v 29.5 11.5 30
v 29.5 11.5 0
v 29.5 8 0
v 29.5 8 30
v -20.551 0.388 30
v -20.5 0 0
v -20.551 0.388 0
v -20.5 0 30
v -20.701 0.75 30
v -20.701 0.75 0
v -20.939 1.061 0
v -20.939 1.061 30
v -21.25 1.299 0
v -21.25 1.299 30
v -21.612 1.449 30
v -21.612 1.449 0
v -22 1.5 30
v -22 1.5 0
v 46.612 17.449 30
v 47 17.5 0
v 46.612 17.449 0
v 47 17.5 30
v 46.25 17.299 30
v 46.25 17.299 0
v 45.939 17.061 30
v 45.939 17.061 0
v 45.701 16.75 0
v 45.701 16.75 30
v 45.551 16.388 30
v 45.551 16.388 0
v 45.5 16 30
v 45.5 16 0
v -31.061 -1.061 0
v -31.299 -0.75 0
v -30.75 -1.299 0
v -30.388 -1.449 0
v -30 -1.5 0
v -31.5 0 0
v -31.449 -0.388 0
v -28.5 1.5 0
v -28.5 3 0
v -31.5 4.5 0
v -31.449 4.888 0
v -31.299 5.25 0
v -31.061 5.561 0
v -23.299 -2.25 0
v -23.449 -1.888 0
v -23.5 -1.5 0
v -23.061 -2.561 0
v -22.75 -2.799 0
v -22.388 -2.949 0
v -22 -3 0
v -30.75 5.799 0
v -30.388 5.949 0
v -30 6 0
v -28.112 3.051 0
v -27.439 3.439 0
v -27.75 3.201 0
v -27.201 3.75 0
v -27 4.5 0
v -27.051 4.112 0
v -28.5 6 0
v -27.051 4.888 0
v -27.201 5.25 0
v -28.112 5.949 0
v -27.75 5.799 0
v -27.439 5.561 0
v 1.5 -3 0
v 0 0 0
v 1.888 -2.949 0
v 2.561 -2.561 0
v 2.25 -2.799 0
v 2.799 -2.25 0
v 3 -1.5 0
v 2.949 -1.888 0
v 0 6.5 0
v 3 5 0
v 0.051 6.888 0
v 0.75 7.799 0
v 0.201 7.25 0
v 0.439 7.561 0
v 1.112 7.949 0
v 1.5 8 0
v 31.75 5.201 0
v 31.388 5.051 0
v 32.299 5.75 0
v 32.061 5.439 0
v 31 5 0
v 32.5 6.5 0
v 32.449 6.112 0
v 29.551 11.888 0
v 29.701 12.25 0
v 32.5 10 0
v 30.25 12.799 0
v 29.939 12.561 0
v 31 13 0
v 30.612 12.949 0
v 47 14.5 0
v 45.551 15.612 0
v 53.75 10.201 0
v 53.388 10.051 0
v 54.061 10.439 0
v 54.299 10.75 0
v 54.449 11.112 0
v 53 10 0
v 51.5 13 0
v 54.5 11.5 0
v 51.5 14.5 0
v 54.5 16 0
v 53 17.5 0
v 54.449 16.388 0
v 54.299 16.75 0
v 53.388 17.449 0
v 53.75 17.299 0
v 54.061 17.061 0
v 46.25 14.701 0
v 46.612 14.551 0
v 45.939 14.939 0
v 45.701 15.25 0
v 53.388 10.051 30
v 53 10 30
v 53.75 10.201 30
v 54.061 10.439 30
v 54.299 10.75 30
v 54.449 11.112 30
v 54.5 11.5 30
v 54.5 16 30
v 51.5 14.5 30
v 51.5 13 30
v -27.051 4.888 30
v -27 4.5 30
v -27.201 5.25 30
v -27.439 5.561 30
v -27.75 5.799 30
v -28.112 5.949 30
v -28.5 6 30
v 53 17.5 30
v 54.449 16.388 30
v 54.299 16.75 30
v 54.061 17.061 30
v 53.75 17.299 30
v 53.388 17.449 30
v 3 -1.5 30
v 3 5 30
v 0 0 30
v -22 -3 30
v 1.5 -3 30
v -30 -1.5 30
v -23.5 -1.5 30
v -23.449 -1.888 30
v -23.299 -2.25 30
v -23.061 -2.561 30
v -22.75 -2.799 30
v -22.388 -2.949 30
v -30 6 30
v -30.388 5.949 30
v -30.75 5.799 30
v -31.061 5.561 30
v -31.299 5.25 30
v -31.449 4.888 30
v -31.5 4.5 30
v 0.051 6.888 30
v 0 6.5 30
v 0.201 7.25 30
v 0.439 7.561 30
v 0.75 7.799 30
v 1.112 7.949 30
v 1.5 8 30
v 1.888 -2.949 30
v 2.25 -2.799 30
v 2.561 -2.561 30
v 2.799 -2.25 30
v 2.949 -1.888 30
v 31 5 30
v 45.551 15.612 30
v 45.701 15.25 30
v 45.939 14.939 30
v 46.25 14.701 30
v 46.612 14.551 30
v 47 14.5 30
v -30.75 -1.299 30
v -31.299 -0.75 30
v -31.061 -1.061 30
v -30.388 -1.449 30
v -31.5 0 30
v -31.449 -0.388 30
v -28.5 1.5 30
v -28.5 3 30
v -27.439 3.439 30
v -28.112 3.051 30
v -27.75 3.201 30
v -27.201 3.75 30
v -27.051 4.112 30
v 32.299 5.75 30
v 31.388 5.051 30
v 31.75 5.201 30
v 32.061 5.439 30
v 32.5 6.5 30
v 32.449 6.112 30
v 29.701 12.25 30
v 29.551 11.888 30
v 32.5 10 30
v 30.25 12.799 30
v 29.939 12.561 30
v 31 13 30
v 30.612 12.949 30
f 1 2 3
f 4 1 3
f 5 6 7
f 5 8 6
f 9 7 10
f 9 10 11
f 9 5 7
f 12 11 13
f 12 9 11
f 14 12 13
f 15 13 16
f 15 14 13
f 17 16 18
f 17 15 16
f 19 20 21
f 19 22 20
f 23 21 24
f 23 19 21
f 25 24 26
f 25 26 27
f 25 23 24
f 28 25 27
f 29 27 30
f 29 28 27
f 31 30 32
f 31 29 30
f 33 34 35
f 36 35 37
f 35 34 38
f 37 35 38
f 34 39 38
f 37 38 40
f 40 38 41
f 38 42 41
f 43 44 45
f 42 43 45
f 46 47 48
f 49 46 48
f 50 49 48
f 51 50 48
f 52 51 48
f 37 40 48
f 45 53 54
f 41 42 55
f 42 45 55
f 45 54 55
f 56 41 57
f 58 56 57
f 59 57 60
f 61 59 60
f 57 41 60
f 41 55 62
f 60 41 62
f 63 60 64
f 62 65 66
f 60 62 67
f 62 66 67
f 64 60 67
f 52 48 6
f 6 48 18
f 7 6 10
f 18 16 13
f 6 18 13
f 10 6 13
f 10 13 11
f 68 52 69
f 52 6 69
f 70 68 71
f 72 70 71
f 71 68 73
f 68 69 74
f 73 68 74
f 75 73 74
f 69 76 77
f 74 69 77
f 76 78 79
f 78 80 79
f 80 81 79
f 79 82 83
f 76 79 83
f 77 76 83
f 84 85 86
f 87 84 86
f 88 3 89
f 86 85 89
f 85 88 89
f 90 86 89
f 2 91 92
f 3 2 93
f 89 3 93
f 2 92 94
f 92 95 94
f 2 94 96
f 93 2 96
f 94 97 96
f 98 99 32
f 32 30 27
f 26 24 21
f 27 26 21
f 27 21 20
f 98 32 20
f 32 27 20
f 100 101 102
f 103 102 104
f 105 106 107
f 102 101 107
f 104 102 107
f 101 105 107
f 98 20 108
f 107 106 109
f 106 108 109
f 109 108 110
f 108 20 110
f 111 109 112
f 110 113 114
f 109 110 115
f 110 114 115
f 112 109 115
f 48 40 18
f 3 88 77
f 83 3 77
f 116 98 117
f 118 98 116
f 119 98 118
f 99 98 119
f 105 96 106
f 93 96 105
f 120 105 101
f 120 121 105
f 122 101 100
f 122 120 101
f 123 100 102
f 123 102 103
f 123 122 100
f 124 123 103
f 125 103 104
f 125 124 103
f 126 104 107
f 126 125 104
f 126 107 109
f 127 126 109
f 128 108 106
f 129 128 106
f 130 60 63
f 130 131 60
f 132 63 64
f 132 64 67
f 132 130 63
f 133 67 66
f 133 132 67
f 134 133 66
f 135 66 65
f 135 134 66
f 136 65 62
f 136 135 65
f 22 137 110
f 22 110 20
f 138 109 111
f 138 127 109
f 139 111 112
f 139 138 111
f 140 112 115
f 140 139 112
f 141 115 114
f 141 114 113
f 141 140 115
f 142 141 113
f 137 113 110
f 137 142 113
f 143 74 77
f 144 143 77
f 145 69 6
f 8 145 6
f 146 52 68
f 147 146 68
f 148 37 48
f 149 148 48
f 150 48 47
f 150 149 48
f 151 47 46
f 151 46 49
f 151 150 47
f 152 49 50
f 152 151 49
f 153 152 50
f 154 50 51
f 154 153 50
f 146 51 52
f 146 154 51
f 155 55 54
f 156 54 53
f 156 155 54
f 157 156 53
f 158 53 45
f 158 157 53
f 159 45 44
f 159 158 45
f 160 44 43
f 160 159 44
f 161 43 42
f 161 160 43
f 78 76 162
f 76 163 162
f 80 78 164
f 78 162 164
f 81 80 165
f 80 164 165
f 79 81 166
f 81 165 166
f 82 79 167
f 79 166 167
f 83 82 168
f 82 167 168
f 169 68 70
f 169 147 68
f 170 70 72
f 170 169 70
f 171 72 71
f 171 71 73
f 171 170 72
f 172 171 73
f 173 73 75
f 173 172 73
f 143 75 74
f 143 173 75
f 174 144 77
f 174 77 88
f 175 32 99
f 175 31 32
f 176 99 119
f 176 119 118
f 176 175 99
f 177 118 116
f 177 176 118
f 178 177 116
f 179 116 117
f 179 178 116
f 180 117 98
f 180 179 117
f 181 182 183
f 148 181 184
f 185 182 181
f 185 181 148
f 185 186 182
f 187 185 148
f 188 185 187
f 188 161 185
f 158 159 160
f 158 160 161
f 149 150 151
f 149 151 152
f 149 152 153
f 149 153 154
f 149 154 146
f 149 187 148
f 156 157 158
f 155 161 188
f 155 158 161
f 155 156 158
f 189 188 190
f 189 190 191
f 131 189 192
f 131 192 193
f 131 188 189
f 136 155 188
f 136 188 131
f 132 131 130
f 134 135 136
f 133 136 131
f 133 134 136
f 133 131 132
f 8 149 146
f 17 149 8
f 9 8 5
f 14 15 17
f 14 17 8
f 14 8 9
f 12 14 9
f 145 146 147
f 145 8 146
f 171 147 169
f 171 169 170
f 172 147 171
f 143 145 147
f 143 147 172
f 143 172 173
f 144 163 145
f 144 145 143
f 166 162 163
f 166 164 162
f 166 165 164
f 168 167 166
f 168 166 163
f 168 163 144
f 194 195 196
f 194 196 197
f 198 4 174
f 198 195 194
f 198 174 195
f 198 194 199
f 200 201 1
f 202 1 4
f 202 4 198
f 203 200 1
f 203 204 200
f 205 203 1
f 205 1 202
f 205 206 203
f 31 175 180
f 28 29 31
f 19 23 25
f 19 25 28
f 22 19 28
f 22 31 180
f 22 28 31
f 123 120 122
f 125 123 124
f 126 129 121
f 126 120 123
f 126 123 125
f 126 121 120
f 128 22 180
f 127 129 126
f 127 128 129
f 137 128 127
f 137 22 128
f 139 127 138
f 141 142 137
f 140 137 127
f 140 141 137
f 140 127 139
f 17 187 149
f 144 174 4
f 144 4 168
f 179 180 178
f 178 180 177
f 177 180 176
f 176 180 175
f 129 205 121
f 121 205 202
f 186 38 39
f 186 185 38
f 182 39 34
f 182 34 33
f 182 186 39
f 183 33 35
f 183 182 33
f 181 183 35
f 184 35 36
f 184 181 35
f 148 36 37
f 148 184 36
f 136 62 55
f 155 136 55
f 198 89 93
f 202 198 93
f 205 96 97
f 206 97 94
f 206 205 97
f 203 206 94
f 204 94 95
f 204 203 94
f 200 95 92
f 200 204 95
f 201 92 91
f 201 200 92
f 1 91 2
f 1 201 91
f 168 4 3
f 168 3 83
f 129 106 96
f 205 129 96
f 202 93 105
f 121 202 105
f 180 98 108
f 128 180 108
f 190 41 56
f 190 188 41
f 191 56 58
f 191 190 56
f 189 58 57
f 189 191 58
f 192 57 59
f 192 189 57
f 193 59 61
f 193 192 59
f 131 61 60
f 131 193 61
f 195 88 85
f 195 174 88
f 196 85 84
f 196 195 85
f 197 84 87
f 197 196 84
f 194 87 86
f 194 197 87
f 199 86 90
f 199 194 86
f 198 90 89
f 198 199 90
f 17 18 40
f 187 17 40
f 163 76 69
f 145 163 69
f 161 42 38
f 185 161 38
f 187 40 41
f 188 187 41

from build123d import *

# Parameters (mm, degrees)
F1_DEPTH = 30
F2_R     = 1.49999


# Not quite as in the source:
# - a fillet or chamfer is up to 0.001 mm smaller than in the source, because OpenCascade refuses the exact size


with BuildPart() as f1:
    # F0 (on Top) → F1 (new body)
    with BuildSketch(Plane.XY):
        Polygon((0, 8), (0, 0), (-20.5, 0), (-20.5, 1.5), (-28.5, 1.5), (-28.5, 3), (-27, 3), (-27, 6), (-31.5, 6), (-31.5, -1.5), (-23.5, -1.5), (-23.5, -3), (3, -3), (3, 5), (32.5, 5), (32.5, 10), (54.5, 10), (54.5, 17.5), (45.5, 17.5), (45.5, 14.5), (51.5, 14.5), (51.5, 13), (29.5, 13), (29.5, 8), align=None)
    extrude(amount=F1_DEPTH)

    # F2 (radius 1.5 in the source; OpenCascade refuses exactly that, so slightly less here)
    f2_edges = [f1.edges().sort_by_distance(p)[0] for p in [
        (-23.5, -3, 15),
        (-31.5, -1.5, 15),
        (-20.5, 1.5, 15),
        (-27, 6, 15),
        (-27, 3, 15),
        (-31.5, 6, 15),
        (3, -3, 15),
        (0, 8, 15),
        (32.5, 5, 15),
        (29.5, 13, 15),
        (45.5, 17.5, 15),
        (45.5, 14.5, 15),
        (54.5, 10, 15),
        (54.5, 17.5, 15),
    ]]
    fillet(f2_edges, radius=F2_R)


solid = f1.part
